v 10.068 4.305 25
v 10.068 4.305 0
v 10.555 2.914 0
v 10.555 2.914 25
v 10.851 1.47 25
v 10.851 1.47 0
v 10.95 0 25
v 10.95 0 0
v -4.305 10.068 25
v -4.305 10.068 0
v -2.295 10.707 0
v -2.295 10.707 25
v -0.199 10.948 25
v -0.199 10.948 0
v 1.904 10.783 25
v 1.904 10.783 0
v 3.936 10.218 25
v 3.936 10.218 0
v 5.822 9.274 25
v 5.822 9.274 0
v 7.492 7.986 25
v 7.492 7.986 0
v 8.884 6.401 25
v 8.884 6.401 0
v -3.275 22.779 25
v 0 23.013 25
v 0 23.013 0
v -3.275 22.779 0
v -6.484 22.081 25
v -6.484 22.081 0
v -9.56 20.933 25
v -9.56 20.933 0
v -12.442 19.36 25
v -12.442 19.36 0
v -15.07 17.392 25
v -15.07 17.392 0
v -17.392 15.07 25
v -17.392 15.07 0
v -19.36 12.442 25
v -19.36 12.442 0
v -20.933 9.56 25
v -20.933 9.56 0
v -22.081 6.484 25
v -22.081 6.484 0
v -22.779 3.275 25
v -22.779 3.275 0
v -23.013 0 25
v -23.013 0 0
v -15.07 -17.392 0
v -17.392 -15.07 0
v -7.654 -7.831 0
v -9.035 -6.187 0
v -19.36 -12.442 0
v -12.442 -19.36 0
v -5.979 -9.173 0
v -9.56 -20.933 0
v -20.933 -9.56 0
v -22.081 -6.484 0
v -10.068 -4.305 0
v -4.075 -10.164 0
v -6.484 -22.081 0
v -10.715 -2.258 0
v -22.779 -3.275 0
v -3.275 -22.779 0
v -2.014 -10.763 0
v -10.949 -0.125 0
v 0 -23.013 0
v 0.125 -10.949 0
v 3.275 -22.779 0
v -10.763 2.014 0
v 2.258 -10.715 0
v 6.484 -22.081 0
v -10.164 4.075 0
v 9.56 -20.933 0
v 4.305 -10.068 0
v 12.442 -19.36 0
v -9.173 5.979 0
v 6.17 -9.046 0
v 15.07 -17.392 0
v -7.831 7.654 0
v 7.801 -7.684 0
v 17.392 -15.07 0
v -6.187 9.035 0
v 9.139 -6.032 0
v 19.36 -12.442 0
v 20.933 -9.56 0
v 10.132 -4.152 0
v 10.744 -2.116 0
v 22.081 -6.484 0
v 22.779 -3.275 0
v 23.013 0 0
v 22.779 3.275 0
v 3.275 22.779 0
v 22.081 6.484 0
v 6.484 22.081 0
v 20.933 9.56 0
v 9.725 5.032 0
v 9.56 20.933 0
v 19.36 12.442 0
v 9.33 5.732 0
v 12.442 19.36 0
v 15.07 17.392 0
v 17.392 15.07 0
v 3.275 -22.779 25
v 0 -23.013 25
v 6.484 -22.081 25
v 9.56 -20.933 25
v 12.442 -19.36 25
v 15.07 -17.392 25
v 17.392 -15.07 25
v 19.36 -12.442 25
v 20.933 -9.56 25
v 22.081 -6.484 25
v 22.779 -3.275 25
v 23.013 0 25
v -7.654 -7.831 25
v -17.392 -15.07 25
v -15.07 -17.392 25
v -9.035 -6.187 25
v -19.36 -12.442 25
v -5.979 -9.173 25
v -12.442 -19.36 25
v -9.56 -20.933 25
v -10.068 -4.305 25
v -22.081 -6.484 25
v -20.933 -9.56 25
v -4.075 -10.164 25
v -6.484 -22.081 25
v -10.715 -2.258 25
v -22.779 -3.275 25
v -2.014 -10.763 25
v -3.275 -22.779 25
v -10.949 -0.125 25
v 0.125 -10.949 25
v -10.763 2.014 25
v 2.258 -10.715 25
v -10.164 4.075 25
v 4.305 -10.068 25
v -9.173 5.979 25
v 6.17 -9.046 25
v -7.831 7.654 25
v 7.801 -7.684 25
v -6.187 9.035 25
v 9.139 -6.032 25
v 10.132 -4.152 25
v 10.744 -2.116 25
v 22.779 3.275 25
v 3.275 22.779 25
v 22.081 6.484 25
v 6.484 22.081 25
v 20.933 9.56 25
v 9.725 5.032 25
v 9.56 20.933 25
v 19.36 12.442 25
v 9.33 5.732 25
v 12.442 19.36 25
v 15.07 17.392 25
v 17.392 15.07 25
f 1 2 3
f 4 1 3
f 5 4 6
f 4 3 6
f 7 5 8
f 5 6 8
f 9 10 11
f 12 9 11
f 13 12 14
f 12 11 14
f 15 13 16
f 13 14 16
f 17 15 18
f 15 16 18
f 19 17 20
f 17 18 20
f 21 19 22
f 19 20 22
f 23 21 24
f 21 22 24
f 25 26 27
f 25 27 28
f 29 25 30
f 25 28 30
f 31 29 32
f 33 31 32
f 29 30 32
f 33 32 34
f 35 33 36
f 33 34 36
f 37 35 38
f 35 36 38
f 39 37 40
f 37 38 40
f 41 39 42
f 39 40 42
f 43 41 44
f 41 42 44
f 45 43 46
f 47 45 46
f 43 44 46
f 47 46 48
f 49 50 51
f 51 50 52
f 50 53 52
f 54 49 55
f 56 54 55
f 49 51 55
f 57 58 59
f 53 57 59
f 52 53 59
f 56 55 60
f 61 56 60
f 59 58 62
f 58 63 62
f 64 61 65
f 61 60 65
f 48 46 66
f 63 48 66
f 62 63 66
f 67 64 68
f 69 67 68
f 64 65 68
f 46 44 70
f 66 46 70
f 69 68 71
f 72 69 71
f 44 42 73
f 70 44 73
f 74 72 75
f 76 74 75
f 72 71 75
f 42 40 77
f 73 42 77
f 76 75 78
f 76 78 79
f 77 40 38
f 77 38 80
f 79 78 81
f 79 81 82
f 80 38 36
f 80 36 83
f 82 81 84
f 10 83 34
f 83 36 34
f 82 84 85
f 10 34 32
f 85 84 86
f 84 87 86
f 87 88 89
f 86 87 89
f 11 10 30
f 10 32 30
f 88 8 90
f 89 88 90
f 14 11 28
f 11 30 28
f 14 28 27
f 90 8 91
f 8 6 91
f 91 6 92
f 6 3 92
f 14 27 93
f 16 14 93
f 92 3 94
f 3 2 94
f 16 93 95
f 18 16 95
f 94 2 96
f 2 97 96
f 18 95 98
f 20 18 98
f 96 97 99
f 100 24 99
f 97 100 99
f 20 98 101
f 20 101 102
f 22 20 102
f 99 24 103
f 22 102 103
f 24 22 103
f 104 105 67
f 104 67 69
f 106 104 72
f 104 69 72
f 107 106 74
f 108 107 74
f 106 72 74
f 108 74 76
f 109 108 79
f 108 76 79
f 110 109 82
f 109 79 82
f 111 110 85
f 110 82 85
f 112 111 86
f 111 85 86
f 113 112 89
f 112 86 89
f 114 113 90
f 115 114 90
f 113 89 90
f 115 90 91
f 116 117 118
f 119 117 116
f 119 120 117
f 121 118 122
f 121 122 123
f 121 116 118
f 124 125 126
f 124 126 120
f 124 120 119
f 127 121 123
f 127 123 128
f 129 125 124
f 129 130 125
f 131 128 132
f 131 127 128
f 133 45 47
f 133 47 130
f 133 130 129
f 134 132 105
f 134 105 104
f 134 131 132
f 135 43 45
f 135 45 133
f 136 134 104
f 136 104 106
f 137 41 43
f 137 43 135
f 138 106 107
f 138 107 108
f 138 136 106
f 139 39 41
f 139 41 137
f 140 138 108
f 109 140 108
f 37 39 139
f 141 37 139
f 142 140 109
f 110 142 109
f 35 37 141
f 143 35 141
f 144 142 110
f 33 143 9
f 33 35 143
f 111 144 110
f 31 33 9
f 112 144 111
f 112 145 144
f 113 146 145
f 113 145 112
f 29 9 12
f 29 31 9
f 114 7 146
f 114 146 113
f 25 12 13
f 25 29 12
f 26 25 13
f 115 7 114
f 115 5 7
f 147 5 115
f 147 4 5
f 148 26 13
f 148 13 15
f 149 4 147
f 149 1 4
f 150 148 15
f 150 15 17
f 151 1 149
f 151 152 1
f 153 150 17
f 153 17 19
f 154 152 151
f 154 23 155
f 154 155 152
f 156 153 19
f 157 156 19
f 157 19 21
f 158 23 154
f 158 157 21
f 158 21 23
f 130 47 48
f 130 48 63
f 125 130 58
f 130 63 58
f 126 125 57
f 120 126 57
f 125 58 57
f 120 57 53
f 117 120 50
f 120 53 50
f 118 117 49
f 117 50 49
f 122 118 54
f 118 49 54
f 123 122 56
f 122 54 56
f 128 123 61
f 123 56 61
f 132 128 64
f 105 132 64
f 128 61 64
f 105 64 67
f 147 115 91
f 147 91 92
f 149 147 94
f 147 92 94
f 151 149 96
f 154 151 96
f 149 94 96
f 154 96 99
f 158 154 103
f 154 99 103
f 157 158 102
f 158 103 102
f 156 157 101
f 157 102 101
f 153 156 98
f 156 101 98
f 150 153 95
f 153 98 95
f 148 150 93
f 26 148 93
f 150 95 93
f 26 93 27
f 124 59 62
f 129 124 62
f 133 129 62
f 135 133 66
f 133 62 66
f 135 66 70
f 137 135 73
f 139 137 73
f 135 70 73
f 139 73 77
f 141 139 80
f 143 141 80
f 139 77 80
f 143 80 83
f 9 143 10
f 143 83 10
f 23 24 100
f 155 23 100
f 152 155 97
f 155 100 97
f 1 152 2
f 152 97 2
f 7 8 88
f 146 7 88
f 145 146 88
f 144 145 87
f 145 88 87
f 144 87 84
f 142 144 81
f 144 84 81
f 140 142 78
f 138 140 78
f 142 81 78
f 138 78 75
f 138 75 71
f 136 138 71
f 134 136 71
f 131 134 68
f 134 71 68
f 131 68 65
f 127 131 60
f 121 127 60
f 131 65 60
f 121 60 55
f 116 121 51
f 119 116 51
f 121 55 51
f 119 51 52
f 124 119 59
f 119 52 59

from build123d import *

# Parameters (mm, degrees)
F1_DEPTH = 25


with BuildPart() as f1:
    # F0 (on Top) → F1 (new body)
    with BuildSketch(Plane.XY):
        with BuildLine():
            ThreePointArc((0, -23.013084), (-10.622454, -16.666771), (-10.068095, -4.305342))
            ThreePointArc((-10.068095, -4.305342), (-10.163555, 4.074881), (-4.305342, 10.068095))
            ThreePointArc((-4.305342, 10.068095), (-16.666771, 10.622454), (-23.013084, 0))
            ThreePointArc((-23.013084, 0), (-16.272708, -16.272708), (0, -23.013084))
        make_face()
        with BuildLine():
            ThreePointArc((8.884421, 6.400748), (9.533999, 5.385662), (10.068095, 4.305342))
            ThreePointArc((10.068095, 4.305342), (10.622454, 16.666771), (0, 23.013084))
            ThreePointArc((0, 23.013084), (-16.272708, 16.272708), (-23.013084, 0))
            ThreePointArc((-23.013084, 0), (-16.666771, 10.622454), (-4.305342, 10.068095))
            ThreePointArc((-4.305342, 10.068095), (2.933317, 10.549794), (8.884421, 6.400748))
        make_face()
        with BuildLine():
            ThreePointArc((23.013084, 0), (16.666771, -10.622454), (4.305342, -10.068095))
            ThreePointArc((4.305342, -10.068095), (-4.074881, -10.163555), (-10.068095, -4.305342))
            ThreePointArc((-10.068095, -4.305342), (-10.622454, -16.666771), (0, -23.013084))
            ThreePointArc((0, -23.013084), (16.272708, -16.272708), (23.013084, 0))
        make_face()
        with BuildLine():
            ThreePointArc((10.068095, 4.305342), (10.727258, 2.197369), (10.95, 0))
            ThreePointArc((10.95, 0), (9.139092, -6.031542), (4.305342, -10.068095))
            ThreePointArc((4.305342, -10.068095), (16.666771, -10.622454), (23.013084, 0))
            ThreePointArc((23.013084, 0), (16.272708, 16.272708), (0, 23.013084))
            ThreePointArc((0, 23.013084), (10.622454, 16.666771), (10.068095, 4.305342))
        make_face()
    extrude(amount=F1_DEPTH)


solid = f1.part
